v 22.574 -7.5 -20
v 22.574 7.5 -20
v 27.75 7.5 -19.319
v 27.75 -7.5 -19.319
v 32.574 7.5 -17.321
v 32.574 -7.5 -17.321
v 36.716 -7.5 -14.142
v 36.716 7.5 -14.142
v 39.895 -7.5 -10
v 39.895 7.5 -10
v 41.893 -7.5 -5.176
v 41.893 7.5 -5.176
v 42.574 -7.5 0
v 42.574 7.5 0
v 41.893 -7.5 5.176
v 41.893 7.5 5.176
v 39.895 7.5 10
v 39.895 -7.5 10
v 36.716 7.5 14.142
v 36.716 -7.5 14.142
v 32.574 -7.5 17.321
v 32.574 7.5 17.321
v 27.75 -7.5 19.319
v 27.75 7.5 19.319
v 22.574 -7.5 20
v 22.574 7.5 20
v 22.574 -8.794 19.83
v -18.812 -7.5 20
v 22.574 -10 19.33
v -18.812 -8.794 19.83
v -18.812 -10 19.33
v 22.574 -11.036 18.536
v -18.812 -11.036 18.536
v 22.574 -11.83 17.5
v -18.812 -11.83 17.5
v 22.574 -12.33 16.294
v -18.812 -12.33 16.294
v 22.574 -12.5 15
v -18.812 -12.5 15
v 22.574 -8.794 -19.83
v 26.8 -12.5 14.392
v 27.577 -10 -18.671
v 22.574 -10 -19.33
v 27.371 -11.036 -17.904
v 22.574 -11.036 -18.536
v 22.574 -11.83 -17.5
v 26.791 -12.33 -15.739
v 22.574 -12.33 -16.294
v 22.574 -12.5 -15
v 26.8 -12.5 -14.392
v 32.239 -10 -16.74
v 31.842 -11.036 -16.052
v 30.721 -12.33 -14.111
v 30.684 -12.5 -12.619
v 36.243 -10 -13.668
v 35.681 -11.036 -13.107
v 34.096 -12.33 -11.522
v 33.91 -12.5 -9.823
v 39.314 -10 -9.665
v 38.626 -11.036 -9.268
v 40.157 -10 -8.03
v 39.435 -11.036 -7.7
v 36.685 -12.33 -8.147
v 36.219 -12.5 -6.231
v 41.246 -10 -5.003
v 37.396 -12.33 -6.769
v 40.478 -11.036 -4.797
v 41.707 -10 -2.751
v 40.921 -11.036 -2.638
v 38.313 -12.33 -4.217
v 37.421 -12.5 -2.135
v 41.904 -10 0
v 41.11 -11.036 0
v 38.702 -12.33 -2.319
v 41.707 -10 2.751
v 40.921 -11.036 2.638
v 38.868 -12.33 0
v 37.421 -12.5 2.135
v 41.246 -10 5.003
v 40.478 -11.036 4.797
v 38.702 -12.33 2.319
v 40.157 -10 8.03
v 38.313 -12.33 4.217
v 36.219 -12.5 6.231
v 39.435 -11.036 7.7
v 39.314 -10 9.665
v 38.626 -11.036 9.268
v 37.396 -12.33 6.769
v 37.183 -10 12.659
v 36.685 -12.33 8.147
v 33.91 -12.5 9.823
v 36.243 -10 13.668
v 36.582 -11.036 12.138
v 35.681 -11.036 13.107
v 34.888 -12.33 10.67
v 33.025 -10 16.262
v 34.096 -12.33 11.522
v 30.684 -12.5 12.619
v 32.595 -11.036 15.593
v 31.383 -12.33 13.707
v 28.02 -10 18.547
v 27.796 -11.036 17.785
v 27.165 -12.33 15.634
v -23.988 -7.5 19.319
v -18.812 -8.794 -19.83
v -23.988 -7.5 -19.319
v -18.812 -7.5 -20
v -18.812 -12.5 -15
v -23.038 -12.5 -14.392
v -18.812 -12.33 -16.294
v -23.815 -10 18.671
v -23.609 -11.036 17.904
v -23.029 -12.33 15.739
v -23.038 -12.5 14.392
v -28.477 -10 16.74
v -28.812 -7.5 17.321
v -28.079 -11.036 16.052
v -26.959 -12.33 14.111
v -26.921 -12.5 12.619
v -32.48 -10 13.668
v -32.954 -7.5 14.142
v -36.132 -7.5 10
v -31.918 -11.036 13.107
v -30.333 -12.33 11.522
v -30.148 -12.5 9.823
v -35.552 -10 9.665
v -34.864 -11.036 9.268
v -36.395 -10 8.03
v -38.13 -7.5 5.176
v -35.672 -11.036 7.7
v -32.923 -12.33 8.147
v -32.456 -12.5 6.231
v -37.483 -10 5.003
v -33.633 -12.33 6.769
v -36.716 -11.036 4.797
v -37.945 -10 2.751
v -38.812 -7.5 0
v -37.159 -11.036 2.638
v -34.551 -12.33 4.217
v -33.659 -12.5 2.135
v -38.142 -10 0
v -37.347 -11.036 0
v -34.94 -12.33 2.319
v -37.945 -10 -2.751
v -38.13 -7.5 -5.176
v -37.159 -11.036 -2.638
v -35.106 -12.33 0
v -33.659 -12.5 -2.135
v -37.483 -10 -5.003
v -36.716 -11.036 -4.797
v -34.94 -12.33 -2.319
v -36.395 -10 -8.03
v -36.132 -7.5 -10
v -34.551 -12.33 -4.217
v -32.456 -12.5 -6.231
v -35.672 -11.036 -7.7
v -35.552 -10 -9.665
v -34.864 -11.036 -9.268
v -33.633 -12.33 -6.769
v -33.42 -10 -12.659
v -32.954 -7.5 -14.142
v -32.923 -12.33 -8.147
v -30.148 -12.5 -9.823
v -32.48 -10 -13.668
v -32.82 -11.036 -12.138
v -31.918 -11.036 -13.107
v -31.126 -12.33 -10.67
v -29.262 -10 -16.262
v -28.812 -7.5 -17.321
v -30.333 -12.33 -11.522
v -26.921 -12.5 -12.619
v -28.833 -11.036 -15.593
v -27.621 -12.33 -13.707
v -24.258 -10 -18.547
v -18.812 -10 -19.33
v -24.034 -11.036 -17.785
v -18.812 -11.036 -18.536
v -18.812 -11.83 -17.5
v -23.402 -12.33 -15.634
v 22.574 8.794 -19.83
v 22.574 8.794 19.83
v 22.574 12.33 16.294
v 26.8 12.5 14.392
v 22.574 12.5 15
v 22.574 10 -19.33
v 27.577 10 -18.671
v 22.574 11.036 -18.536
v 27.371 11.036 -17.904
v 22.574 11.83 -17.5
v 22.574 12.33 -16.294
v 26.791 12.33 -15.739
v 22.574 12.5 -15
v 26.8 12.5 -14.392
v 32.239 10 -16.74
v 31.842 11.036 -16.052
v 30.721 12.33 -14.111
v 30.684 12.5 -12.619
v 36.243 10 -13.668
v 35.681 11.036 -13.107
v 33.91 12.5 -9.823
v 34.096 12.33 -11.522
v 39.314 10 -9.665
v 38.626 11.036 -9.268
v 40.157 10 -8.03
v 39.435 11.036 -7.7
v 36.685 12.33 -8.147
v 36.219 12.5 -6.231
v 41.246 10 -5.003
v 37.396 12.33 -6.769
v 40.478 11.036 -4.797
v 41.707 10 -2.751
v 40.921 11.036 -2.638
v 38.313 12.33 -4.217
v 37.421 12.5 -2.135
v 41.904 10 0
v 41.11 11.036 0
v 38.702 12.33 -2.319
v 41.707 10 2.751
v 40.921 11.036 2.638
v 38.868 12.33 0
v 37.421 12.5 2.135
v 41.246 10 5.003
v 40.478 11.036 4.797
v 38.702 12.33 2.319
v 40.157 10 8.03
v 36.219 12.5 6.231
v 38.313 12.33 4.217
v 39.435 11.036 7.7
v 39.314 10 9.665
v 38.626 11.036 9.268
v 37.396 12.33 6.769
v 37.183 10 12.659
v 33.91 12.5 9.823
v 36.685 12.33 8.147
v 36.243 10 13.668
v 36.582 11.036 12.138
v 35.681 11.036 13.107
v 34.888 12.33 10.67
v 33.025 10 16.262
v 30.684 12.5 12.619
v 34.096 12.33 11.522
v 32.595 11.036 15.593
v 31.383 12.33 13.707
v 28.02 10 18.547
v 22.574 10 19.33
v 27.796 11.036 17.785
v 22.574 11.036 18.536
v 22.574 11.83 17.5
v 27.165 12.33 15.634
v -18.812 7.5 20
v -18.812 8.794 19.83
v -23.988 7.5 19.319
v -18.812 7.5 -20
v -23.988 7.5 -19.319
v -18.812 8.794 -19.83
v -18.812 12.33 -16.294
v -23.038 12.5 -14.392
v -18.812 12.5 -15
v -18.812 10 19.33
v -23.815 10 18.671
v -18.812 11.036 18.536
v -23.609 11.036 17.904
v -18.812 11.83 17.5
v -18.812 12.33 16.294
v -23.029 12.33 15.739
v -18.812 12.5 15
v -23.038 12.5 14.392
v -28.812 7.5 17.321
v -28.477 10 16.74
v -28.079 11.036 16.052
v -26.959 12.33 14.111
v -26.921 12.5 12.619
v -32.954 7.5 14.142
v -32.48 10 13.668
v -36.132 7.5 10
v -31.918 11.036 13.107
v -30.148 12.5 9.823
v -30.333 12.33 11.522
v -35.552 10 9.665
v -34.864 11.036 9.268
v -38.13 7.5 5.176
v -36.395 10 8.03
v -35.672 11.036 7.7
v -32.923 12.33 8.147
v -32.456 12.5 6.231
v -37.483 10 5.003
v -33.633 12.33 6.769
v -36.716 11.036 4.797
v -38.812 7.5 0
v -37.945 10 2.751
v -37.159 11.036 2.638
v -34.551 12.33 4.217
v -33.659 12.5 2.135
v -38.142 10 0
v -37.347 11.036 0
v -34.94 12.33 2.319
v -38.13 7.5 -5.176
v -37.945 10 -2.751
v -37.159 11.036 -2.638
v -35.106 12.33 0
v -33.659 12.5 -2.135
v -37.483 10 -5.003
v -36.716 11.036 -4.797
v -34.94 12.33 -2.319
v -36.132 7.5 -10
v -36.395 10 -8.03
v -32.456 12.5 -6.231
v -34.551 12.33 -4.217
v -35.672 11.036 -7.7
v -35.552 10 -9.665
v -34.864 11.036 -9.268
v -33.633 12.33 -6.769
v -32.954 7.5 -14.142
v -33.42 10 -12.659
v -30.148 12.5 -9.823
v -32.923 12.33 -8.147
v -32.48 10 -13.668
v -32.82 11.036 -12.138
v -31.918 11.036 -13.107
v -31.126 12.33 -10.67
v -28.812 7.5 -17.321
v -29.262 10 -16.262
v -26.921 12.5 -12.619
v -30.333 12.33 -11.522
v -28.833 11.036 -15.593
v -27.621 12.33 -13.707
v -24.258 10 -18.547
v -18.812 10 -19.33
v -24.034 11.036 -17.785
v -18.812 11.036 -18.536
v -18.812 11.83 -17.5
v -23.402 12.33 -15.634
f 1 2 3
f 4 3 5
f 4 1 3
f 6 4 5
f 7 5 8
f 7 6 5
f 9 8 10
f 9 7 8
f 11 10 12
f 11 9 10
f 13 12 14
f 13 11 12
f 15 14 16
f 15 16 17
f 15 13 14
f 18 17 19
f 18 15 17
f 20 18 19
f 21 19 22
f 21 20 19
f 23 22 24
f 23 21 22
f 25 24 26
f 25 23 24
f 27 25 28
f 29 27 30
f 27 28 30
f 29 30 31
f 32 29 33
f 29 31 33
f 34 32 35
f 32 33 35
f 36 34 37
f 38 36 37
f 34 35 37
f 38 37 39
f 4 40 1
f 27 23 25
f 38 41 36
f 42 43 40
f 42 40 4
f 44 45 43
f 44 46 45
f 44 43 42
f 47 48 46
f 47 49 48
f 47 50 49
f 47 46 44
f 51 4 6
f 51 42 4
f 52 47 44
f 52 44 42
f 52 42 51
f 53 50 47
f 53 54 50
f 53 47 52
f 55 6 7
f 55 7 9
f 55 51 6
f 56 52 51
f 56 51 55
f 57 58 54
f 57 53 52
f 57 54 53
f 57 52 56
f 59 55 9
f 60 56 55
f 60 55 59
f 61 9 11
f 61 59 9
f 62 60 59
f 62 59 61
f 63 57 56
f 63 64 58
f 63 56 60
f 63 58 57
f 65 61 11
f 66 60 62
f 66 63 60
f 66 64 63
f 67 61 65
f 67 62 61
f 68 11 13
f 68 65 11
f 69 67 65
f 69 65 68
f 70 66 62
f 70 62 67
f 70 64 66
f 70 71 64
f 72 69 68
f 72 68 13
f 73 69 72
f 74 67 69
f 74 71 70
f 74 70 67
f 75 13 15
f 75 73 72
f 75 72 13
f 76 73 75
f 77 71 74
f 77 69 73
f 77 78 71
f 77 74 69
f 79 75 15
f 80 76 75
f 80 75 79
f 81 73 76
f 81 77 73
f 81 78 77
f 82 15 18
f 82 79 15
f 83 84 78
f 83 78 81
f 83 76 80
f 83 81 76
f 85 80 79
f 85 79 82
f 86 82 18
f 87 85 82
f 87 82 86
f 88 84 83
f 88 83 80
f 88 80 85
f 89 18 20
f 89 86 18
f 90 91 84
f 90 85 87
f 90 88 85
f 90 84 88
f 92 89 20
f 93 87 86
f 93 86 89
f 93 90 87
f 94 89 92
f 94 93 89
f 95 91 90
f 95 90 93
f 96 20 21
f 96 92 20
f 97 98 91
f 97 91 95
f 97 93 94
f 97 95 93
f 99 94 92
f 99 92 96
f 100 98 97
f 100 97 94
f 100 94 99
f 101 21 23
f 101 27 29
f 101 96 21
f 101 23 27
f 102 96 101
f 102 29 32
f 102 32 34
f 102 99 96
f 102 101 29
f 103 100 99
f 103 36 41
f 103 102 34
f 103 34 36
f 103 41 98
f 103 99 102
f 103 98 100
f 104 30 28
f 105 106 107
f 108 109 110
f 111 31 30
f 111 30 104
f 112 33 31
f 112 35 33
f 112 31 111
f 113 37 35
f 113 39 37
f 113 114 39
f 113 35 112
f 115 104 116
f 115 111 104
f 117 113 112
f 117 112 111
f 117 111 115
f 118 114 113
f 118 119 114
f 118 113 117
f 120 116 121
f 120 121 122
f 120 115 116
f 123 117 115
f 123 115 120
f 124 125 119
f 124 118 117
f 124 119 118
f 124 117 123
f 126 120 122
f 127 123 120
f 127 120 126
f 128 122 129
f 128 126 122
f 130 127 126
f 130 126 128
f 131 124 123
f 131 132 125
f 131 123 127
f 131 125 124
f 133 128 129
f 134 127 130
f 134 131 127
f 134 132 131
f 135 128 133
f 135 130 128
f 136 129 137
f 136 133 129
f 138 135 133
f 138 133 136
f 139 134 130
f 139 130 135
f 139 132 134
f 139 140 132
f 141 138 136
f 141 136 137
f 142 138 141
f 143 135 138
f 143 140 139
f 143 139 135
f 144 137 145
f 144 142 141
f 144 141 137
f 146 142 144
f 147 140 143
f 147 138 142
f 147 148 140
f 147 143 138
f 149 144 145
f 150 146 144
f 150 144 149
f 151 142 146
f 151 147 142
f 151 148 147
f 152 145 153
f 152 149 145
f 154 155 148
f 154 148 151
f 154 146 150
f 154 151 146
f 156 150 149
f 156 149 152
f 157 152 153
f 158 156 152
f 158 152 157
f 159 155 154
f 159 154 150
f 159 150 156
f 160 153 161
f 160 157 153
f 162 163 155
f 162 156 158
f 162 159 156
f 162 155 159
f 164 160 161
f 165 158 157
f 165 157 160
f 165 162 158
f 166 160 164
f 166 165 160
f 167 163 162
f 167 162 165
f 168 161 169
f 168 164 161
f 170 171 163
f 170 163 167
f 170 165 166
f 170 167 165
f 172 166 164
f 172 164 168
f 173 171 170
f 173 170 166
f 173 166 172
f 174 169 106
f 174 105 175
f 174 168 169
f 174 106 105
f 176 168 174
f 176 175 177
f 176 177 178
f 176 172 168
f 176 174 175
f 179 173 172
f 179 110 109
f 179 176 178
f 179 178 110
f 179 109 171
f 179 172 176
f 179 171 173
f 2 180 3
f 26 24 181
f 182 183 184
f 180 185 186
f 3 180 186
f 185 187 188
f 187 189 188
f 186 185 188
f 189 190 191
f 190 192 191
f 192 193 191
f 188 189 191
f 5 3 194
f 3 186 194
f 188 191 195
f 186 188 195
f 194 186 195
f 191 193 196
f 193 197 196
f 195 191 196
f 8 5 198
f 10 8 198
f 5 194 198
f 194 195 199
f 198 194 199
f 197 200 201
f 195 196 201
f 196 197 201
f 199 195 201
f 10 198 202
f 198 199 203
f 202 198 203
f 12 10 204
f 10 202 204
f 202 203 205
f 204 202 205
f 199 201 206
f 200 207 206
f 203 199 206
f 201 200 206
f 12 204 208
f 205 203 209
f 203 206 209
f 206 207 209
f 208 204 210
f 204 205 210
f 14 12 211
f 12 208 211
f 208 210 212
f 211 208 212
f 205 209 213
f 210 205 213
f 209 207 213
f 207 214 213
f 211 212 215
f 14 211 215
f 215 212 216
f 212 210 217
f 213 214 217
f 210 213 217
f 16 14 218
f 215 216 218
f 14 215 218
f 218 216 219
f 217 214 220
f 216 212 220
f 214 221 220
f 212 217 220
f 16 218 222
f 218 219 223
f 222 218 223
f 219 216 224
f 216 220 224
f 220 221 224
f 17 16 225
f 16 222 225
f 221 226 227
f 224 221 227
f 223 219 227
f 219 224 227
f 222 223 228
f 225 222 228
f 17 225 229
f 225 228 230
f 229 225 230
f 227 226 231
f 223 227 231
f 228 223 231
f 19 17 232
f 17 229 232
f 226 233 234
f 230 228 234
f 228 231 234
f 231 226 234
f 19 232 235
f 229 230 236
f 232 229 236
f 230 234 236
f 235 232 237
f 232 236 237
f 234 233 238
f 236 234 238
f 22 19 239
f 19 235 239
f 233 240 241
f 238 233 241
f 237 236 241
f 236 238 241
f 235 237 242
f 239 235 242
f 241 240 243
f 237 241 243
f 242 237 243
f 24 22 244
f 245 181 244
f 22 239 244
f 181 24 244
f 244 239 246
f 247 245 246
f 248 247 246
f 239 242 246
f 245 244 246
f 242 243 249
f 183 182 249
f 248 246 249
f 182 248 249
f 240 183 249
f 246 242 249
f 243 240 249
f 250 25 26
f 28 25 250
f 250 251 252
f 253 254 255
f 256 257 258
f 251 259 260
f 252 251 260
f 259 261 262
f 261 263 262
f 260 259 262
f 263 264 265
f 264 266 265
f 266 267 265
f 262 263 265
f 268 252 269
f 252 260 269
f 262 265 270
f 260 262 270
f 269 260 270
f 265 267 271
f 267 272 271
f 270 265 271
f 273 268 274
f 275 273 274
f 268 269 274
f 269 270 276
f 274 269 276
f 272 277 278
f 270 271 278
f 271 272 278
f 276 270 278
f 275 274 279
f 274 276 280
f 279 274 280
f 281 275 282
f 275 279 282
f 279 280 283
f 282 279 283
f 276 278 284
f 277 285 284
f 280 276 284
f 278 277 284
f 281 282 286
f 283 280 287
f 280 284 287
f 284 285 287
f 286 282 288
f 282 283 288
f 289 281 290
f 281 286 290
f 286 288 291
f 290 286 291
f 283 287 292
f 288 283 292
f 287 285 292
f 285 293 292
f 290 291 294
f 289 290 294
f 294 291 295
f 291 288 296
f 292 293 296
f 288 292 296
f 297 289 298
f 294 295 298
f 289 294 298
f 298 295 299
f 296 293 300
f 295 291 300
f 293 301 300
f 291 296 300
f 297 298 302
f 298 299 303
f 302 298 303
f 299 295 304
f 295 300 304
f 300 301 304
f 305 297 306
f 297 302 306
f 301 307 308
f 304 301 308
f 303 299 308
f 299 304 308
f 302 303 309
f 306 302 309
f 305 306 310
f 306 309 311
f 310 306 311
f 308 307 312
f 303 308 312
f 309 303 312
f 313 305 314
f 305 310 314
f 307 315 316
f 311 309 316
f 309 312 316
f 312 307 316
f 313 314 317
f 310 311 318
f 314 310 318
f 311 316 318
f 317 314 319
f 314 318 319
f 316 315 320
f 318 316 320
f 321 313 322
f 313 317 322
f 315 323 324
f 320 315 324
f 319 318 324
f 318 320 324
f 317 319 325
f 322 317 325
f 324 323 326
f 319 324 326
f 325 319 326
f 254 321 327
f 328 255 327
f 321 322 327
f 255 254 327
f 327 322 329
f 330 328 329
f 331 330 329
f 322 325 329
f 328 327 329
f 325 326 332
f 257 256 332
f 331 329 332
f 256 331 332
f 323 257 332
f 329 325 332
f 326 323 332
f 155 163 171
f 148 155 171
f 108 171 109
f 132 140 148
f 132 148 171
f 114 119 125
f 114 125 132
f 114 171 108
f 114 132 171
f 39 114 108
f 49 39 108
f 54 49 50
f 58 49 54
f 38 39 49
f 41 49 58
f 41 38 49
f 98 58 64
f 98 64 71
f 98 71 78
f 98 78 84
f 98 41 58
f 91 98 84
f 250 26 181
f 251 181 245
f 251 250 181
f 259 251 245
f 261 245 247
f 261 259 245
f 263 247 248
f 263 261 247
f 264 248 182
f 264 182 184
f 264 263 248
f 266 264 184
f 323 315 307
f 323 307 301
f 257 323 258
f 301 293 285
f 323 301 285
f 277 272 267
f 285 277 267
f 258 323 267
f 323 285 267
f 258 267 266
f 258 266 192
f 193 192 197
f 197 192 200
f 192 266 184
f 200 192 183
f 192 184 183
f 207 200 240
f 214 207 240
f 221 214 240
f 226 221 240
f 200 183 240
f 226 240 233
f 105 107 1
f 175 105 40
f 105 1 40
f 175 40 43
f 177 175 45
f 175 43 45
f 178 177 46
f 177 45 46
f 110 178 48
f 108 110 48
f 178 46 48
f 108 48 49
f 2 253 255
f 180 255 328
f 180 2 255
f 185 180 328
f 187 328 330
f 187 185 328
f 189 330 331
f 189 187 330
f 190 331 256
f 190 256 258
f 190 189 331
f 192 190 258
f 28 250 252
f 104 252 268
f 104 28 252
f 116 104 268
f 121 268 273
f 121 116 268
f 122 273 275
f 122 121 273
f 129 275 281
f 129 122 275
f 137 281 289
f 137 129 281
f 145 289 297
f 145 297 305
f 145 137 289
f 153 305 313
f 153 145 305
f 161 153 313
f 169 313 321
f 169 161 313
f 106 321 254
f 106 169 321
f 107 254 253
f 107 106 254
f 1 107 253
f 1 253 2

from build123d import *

# Parameters (mm, degrees)
F1_DEPTH = 12.5
F2_R     = 5


with BuildPart() as f1:
    # F0 (on Front) → F1 (new body, symmetric)
    with BuildSketch(Plane.XZ):
        with BuildLine():
            ThreePointArc((-18.81171, 20), (-38.81171, 0), (-18.81171, -20))
            Line((-18.81171, -20), (22.574065, -20))
            ThreePointArc((22.574065, -20), (42.574065, 0), (22.574065, 20))
            Line((22.574065, 20), (-18.81171, 20))
        make_face()
    extrude(amount=F1_DEPTH, both=True)

    # F2
    f2_edges = [f1.edges().sort_by_distance(p)[0] for p in [
        (42.574065, -12.5, 0),
        (42.574065, 12.5, 0),
    ]]
    fillet(f2_edges, radius=F2_R)


solid = f1.part
